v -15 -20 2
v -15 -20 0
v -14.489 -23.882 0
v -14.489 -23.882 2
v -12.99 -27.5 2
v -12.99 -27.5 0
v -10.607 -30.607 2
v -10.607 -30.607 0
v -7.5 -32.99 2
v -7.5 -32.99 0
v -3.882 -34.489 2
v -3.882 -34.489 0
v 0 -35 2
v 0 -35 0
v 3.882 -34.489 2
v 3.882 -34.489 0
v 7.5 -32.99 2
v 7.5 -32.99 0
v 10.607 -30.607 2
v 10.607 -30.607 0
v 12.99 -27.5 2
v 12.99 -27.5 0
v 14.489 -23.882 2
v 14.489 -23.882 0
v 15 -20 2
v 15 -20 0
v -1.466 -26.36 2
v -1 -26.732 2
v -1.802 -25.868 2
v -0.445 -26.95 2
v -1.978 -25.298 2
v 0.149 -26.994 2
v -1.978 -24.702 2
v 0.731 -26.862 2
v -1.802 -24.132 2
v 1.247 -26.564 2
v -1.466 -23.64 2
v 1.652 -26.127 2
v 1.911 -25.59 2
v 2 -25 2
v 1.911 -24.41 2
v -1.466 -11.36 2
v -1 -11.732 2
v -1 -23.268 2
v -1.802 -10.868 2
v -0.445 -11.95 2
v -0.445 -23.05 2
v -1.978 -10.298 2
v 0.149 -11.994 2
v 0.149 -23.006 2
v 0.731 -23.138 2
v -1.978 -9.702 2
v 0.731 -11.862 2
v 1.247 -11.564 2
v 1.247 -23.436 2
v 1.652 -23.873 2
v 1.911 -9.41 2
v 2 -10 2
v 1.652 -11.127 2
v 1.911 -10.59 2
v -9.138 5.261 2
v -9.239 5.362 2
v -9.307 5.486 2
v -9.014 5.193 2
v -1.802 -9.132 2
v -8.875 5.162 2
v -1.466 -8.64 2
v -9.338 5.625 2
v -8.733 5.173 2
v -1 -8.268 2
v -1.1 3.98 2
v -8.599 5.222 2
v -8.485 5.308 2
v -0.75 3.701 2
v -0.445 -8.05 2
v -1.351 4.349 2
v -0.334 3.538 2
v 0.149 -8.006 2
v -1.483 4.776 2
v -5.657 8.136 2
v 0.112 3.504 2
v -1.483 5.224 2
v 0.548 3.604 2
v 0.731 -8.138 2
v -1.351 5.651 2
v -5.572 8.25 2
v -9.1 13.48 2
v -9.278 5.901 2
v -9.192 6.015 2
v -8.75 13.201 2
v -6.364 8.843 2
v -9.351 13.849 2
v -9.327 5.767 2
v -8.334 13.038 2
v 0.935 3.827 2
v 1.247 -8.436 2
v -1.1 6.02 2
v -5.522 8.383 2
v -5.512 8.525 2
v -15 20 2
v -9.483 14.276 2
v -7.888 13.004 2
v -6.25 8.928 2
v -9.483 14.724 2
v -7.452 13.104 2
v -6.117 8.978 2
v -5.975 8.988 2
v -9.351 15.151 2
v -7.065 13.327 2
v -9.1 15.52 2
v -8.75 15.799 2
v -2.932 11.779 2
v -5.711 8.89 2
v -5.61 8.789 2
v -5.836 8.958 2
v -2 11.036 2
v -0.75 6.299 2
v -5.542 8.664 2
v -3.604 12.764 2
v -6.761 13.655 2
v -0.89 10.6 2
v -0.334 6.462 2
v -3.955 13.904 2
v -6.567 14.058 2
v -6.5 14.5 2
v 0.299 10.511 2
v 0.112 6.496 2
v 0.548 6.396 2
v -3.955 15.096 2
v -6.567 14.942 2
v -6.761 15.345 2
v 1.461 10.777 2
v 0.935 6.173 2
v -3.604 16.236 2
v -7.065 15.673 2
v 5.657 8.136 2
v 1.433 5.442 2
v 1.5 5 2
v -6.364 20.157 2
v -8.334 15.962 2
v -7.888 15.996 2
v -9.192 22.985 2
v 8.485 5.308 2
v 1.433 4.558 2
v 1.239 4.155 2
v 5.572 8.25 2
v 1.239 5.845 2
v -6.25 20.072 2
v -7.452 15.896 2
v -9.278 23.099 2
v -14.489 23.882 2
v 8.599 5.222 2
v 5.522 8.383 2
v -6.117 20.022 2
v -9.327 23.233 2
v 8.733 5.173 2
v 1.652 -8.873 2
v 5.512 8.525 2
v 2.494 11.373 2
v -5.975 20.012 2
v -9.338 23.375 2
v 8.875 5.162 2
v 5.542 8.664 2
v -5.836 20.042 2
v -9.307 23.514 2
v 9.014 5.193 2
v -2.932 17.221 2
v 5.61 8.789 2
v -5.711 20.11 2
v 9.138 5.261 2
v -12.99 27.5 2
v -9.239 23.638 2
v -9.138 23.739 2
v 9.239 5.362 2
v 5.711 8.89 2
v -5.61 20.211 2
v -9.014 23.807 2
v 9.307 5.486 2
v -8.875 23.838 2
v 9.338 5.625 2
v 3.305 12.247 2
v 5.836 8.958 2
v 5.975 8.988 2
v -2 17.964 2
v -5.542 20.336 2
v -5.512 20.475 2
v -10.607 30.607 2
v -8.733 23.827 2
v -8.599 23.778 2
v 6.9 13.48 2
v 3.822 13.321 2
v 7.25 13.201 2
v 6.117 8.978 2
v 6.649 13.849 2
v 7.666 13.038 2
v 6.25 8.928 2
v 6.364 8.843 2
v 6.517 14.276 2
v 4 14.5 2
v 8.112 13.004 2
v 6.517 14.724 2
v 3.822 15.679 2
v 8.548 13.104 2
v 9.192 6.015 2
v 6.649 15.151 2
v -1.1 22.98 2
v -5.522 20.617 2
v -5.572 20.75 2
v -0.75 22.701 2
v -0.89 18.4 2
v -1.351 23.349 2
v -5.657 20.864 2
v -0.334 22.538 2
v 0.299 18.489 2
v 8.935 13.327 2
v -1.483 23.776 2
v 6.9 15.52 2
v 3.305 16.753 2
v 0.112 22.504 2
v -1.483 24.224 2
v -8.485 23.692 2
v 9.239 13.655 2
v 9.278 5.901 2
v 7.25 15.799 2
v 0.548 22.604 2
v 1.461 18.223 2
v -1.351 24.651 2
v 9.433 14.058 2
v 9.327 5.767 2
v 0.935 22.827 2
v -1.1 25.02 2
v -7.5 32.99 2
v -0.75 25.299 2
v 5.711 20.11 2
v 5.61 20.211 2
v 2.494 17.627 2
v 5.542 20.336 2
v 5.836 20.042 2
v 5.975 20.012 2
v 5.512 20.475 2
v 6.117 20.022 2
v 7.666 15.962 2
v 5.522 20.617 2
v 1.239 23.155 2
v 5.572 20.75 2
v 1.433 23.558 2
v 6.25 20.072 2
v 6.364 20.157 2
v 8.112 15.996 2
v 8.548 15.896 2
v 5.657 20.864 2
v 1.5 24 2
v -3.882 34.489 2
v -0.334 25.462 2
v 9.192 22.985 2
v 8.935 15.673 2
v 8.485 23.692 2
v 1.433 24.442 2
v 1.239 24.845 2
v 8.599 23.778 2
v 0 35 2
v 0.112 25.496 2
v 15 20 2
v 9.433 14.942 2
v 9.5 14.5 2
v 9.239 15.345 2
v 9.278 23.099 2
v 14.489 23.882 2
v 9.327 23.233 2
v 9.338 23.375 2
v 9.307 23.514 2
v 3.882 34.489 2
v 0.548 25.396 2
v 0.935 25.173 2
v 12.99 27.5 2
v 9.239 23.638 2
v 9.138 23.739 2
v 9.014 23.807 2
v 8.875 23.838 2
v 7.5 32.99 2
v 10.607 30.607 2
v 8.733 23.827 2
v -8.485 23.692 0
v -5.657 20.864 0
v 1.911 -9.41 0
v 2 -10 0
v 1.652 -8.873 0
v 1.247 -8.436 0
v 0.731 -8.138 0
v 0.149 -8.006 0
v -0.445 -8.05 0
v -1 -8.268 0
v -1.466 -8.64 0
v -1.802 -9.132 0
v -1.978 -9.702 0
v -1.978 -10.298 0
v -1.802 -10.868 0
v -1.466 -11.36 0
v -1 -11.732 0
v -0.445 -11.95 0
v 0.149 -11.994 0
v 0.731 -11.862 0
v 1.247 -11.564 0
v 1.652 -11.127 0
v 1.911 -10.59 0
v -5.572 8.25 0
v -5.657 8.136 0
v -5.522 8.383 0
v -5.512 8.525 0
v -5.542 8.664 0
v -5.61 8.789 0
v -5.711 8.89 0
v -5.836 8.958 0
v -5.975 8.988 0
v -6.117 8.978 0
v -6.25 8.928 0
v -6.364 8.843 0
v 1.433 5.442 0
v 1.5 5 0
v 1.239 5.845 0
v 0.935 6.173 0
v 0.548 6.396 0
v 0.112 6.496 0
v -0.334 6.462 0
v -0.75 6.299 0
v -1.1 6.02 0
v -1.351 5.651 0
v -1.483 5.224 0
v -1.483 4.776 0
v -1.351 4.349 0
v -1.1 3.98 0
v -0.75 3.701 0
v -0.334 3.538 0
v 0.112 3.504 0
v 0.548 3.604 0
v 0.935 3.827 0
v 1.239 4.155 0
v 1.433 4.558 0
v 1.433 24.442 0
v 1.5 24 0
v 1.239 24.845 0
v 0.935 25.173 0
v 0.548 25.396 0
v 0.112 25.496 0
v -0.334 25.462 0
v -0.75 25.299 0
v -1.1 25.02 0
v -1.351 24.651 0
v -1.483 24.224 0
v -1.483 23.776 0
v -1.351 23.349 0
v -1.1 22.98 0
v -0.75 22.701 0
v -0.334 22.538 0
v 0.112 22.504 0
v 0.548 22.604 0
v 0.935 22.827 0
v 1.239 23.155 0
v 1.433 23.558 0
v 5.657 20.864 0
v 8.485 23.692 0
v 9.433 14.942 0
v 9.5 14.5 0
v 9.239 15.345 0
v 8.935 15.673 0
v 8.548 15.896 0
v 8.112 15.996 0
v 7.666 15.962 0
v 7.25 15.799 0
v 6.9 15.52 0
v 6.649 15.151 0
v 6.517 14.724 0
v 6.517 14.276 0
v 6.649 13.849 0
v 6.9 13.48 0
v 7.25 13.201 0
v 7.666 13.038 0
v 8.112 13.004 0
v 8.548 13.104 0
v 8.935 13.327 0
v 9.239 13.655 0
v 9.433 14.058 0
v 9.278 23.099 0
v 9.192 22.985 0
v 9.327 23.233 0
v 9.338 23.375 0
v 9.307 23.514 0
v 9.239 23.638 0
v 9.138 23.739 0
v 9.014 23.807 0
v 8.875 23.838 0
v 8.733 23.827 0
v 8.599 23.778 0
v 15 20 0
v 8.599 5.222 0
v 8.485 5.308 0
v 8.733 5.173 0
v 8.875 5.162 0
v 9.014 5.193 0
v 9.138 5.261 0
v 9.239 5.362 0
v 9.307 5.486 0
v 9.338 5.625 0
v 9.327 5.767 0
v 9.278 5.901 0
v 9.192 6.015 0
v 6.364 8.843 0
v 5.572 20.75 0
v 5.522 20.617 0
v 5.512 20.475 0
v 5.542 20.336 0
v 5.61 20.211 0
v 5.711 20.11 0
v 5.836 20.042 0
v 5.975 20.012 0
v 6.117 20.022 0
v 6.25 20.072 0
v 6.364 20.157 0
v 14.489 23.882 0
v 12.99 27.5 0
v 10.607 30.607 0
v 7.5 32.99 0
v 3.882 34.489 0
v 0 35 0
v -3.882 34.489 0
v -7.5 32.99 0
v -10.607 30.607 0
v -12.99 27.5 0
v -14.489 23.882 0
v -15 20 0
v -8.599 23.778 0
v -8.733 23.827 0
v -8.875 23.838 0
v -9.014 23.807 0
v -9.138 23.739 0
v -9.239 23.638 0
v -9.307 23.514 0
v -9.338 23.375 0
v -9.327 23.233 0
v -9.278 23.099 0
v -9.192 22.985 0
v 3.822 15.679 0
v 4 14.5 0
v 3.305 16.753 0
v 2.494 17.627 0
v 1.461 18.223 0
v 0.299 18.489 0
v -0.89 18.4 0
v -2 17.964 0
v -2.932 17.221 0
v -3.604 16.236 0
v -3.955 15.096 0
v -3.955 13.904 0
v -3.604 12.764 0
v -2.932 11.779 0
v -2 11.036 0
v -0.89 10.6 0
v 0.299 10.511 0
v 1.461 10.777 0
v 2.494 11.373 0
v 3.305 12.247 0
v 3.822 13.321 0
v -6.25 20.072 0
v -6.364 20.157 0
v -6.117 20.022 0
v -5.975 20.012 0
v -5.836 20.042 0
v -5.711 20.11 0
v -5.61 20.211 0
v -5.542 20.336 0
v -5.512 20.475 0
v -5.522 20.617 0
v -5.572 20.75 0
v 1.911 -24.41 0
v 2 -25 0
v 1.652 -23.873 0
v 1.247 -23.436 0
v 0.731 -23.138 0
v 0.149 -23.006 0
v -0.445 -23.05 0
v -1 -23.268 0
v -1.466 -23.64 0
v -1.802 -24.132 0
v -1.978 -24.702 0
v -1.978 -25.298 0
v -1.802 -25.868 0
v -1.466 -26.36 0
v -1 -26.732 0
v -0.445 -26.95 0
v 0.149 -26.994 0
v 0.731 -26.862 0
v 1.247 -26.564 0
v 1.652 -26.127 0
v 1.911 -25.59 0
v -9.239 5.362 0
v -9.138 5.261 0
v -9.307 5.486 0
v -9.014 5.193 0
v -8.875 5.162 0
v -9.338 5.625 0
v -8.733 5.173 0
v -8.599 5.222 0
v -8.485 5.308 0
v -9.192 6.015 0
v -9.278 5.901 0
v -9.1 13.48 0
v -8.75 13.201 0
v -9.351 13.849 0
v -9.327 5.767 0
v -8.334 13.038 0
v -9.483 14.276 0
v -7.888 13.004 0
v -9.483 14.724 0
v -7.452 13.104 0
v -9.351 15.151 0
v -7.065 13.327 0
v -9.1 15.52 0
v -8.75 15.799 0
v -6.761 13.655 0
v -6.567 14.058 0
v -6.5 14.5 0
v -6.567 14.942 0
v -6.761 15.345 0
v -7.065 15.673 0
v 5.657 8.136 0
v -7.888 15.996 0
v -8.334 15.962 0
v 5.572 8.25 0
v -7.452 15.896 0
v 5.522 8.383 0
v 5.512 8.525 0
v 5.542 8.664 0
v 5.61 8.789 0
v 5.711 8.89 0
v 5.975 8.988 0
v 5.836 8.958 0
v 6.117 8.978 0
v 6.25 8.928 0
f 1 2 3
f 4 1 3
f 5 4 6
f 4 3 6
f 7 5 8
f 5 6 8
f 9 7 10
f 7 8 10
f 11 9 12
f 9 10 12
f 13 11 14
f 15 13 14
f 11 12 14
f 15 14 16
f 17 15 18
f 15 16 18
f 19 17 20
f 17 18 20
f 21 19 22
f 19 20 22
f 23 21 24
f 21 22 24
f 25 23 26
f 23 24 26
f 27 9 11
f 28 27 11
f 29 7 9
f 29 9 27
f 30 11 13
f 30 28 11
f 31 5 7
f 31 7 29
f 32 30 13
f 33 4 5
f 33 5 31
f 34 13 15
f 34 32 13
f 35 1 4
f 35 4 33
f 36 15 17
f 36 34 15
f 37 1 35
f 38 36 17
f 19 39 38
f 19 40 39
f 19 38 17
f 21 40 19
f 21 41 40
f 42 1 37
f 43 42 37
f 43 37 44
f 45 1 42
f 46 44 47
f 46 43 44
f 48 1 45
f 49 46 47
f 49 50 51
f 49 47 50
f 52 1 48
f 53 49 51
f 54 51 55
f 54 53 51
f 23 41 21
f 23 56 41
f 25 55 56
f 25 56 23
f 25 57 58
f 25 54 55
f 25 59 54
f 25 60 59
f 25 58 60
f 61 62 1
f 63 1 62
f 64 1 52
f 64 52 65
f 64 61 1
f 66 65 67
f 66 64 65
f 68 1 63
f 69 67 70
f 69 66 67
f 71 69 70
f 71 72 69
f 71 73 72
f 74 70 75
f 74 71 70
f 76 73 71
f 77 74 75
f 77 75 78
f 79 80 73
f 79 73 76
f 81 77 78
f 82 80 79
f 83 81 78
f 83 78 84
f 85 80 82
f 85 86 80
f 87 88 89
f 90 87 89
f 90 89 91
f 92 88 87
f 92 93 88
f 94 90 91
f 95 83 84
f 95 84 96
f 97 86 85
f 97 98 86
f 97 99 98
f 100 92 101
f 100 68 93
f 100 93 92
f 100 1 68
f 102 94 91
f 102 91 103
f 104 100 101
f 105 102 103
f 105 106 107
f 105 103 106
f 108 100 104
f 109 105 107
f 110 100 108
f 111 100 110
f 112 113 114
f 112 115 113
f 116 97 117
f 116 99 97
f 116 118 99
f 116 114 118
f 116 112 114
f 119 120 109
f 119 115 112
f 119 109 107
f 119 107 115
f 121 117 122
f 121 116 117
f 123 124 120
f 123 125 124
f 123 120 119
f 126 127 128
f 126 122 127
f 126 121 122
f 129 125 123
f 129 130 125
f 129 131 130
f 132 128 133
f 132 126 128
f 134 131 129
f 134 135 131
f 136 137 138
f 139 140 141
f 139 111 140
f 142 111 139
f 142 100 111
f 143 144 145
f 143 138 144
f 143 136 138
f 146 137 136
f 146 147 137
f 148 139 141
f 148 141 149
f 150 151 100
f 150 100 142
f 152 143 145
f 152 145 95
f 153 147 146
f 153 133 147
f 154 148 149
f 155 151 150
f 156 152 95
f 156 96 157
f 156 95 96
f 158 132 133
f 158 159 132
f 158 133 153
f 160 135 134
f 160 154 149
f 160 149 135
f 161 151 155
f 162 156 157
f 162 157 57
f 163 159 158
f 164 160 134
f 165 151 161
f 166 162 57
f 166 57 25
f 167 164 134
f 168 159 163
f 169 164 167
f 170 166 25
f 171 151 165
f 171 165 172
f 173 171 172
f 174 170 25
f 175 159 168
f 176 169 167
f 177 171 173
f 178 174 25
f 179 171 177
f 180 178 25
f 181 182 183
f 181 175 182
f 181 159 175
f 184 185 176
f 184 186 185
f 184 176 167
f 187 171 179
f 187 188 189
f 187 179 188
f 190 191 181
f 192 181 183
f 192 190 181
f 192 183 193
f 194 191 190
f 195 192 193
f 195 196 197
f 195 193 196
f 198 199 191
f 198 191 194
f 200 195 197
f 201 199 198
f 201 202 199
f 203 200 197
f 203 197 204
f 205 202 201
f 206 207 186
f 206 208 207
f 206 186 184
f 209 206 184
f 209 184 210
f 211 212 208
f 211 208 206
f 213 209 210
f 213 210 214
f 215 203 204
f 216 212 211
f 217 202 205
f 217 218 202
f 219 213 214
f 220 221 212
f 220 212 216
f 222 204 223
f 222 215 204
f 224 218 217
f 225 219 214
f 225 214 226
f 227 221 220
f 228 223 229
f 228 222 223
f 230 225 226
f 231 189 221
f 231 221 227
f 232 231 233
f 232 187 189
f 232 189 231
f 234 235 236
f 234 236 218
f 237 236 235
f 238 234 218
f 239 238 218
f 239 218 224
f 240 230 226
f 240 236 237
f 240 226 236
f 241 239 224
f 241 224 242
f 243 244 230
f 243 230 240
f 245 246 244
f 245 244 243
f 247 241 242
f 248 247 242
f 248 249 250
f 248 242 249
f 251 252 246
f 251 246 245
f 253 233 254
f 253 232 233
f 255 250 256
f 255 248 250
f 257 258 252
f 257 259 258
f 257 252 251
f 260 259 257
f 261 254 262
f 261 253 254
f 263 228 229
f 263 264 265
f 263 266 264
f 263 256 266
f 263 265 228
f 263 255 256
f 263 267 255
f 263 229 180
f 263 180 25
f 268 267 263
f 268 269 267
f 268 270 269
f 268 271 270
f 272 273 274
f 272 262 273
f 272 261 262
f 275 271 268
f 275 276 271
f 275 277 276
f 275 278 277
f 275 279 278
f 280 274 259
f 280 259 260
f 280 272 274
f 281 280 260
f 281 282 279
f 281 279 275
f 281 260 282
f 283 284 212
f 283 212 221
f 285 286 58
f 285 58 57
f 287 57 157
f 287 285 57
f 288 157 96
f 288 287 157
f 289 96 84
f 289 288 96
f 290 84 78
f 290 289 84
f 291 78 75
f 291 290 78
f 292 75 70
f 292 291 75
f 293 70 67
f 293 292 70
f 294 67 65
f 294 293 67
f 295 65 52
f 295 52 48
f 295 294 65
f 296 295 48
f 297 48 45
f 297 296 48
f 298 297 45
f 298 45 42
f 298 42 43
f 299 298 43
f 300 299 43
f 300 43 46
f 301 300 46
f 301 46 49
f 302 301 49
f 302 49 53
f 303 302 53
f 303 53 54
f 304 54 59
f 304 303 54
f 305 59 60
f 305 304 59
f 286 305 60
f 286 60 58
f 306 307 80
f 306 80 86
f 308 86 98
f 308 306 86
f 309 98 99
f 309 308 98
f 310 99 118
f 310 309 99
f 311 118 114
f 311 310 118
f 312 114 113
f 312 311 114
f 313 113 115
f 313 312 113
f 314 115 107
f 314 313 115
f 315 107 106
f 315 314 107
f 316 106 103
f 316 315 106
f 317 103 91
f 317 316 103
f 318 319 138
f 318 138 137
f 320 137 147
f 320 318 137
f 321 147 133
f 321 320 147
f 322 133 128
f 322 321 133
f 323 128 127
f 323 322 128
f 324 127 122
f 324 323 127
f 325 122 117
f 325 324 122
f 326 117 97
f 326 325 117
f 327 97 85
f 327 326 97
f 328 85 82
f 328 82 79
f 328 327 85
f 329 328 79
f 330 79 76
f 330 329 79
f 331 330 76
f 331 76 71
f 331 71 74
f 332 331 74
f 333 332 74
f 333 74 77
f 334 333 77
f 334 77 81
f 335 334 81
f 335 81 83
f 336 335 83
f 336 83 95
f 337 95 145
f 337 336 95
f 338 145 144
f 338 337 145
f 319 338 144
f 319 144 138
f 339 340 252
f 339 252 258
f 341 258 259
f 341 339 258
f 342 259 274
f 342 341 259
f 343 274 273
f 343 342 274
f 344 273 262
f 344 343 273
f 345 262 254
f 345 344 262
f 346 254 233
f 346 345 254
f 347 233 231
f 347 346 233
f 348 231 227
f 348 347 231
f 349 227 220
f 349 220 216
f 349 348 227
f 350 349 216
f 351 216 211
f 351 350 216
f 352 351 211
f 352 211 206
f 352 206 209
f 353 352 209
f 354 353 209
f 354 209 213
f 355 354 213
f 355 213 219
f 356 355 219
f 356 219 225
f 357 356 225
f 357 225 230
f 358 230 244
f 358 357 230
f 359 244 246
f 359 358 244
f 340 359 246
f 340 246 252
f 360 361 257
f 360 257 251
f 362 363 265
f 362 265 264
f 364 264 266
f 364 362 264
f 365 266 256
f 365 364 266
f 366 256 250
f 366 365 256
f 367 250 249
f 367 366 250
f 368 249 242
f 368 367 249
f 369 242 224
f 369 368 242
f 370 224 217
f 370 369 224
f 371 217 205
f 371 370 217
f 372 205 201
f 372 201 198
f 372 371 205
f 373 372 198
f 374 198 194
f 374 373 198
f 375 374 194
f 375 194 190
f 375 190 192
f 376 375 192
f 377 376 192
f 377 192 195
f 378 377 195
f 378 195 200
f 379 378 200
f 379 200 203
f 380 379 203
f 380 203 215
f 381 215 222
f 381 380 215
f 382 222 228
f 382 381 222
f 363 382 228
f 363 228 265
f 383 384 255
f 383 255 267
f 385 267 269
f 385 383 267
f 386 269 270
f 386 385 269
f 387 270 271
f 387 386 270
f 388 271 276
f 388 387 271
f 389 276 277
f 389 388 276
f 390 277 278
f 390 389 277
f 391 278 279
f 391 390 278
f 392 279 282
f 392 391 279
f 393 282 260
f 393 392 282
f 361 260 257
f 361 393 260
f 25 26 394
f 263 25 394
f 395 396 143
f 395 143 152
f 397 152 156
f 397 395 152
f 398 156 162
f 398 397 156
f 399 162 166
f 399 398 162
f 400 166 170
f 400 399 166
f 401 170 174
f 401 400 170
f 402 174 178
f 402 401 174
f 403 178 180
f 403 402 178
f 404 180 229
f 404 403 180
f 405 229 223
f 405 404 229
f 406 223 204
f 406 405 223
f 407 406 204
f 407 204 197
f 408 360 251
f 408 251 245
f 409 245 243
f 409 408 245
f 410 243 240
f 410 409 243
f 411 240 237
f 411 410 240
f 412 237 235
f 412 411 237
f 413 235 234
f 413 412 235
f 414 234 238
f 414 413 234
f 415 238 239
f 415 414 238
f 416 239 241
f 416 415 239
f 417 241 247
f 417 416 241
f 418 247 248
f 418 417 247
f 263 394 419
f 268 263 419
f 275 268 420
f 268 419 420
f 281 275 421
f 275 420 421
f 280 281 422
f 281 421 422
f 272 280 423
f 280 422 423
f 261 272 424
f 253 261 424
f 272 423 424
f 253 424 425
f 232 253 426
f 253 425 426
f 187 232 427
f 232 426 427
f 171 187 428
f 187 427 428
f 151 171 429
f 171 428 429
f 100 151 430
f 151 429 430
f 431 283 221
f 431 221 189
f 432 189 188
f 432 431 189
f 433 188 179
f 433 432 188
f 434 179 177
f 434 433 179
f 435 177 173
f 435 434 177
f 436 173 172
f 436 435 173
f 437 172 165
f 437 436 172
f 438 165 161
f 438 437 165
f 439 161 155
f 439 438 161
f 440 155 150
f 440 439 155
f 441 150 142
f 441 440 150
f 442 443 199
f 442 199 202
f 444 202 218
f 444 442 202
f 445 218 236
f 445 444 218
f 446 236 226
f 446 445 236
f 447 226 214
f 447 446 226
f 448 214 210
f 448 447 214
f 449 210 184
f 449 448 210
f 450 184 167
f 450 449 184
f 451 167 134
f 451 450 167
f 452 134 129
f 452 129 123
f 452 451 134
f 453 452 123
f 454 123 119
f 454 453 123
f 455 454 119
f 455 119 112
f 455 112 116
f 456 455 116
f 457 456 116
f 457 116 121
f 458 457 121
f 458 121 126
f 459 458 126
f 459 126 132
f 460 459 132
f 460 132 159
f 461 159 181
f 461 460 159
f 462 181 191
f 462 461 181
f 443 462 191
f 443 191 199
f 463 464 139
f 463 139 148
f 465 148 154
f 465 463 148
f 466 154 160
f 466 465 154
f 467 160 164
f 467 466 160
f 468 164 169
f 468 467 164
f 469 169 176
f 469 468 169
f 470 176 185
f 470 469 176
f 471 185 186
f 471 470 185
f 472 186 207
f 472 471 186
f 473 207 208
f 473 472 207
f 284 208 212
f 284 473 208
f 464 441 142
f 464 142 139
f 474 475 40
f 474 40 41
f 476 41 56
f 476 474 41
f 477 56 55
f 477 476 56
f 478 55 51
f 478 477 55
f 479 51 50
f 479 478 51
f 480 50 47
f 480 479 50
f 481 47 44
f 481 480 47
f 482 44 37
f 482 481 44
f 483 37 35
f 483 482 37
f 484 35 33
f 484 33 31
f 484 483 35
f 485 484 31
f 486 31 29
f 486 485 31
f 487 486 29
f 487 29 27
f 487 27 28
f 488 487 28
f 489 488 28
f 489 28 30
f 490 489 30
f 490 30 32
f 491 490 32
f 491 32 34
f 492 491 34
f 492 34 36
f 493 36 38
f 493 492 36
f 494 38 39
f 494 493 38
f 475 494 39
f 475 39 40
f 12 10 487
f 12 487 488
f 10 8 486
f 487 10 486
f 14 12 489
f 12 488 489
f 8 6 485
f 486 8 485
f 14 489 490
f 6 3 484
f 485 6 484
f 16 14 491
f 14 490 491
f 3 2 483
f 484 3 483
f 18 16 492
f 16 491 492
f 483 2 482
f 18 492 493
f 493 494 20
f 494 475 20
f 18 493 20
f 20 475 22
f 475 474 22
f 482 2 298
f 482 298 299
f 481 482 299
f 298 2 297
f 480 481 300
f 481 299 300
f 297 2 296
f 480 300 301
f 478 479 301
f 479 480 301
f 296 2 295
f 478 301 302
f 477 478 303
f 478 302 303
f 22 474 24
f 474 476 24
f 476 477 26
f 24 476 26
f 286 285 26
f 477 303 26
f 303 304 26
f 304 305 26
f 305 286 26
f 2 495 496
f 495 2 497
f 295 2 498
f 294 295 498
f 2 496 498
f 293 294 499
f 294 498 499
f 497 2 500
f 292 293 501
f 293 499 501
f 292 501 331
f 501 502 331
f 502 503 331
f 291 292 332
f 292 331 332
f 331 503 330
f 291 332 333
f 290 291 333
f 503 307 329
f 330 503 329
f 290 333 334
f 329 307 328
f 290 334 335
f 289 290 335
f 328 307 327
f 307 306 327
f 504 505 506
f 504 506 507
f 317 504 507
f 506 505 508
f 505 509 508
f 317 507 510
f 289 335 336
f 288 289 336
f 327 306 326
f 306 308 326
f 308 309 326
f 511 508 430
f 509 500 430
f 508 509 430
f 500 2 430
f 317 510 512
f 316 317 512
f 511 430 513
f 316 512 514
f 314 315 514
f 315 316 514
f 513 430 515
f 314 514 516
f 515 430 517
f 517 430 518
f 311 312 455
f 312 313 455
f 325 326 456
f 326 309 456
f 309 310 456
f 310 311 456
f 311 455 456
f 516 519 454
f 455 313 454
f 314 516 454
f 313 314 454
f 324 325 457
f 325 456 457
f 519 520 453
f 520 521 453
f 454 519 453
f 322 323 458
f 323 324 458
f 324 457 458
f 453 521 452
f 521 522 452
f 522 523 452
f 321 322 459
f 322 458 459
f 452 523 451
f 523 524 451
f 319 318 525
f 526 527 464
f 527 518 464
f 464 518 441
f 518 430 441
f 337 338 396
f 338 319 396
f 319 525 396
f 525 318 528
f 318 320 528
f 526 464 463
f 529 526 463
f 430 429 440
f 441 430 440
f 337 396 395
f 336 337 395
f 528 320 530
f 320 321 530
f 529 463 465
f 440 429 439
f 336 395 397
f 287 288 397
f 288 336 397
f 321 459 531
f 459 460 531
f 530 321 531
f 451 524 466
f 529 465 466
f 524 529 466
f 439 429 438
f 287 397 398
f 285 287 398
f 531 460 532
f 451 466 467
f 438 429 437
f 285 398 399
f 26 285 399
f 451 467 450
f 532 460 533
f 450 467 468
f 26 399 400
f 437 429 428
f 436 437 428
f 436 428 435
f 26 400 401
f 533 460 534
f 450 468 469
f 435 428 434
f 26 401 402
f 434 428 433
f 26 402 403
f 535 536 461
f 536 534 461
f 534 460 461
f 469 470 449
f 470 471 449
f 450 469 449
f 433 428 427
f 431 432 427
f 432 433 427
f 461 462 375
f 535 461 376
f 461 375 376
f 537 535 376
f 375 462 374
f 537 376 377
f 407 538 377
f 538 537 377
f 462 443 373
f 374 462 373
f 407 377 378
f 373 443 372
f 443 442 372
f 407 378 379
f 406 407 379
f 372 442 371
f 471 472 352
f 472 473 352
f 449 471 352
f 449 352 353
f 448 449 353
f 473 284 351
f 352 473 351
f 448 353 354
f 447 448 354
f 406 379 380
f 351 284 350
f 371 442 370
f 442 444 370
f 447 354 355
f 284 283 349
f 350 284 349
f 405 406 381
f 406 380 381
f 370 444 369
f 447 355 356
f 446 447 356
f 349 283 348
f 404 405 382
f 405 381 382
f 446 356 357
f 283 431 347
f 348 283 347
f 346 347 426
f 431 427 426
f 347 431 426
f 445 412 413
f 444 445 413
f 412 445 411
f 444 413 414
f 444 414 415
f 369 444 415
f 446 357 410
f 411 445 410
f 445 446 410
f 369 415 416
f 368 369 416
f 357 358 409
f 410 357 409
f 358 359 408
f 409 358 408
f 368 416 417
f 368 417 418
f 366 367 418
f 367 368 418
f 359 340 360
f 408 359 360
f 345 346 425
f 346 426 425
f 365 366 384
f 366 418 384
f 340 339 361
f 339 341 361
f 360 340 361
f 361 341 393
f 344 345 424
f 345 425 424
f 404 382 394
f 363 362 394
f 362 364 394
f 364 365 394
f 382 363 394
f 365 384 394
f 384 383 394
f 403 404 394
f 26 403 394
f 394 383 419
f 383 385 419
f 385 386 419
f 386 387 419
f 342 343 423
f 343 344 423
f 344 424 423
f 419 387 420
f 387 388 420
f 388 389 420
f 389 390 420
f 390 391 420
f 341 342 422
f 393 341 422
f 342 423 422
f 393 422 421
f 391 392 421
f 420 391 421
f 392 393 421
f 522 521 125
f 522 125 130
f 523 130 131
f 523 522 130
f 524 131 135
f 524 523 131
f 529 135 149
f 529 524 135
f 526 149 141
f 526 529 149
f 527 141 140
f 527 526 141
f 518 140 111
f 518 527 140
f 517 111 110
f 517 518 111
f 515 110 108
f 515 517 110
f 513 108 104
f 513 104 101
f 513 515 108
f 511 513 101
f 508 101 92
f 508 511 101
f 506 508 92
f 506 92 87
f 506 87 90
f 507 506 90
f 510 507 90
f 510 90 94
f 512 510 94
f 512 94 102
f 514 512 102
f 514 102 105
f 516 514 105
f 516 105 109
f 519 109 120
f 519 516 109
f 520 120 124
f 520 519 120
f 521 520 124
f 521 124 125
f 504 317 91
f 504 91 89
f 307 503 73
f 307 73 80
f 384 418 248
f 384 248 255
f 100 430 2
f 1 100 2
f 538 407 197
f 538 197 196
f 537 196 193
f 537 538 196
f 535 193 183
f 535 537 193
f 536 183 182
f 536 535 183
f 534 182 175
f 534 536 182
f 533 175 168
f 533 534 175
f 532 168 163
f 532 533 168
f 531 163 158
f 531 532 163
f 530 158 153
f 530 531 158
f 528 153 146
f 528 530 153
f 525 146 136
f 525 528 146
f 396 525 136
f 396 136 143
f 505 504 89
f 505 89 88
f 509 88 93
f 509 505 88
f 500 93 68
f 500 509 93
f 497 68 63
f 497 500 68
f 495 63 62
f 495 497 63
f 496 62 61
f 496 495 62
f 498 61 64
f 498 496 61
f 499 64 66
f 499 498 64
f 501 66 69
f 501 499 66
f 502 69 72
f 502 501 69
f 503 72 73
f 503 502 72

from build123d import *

# Parameters (mm, degrees)
SKETCH1_R           = 2
SKETCH1_R_2         = 1.5
SKETCH1_R_3         = 4
BOSS_EXTRUDE1_DEPTH = 2


with BuildPart() as part:
    # Sketch1 → Boss-Extrude1 (new body)
    with BuildSketch(Plane.XY):
        with BuildLine():
            Line((-15, 20), (-15, -20))
            ThreePointArc((-15, -20), (0, -35), (15, -20))
            Line((15, -20), (15, 20))
            ThreePointArc((15, 20), (0, 35), (-15, 20))
        make_face()
        with Locations((0, -25)):
            Circle(SKETCH1_R, mode=Mode.SUBTRACT)
        with Locations((0, -10)):
            Circle(SKETCH1_R, mode=Mode.SUBTRACT)
        with Locations((0, 5)):
            Circle(SKETCH1_R_2, mode=Mode.SUBTRACT)
        with Locations((0, 24)):
            Circle(SKETCH1_R_2, mode=Mode.SUBTRACT)
        with Locations((-8, 14.5)):
            Circle(SKETCH1_R_2, mode=Mode.SUBTRACT)
        with Locations((8, 14.5)):
            Circle(SKETCH1_R_2, mode=Mode.SUBTRACT)
        with Locations((0, 14.5)):
            Circle(SKETCH1_R_3, mode=Mode.SUBTRACT)
        with BuildLine():
            Line((5.656854249, 8.136038969), (8.485281374, 5.307611845))
            ThreePointArc((8.485281374, 5.307611845), (9.192388155, 5.307611845), (9.192388155, 6.014718626))
            Line((9.192388155, 6.014718626), (6.363961031, 8.843145751))
            ThreePointArc((6.363961031, 8.843145751), (5.656854249, 8.843145751), (5.656854249, 8.136038969))
        make_face(mode=Mode.SUBTRACT)
        with BuildLine():
            Line((-6.363961031, 8.843145751), (-9.192388155, 6.014718626))
            ThreePointArc((-9.192388155, 6.014718626), (-9.192388155, 5.307611845), (-8.485281374, 5.307611845))
            Line((-8.485281374, 5.307611845), (-5.656854249, 8.136038969))
            ThreePointArc((-5.656854249, 8.136038969), (-5.656854249, 8.843145751), (-6.363961031, 8.843145751))
        make_face(mode=Mode.SUBTRACT)
        with BuildLine():
            Line((6.363961031, 20.156854249), (9.192388155, 22.985281374))
            ThreePointArc((9.192388155, 22.985281374), (9.192388155, 23.692388155), (8.485281374, 23.692388155))
            Line((8.485281374, 23.692388155), (5.656854249, 20.863961031))
            ThreePointArc((5.656854249, 20.863961031), (5.656854249, 20.156854249), (6.363961031, 20.156854249))
        make_face(mode=Mode.SUBTRACT)
        with BuildLine():
            Line((-5.656854249, 20.863961031), (-8.485281374, 23.692388155))
            ThreePointArc((-8.485281374, 23.692388155), (-9.192388155, 23.692388155), (-9.192388155, 22.985281374))
            Line((-9.192388155, 22.985281374), (-6.363961031, 20.156854249))
            ThreePointArc((-6.363961031, 20.156854249), (-5.656854249, 20.156854249), (-5.656854249, 20.863961031))
        make_face(mode=Mode.SUBTRACT)
    extrude(amount=BOSS_EXTRUDE1_DEPTH)


solid = part.part
